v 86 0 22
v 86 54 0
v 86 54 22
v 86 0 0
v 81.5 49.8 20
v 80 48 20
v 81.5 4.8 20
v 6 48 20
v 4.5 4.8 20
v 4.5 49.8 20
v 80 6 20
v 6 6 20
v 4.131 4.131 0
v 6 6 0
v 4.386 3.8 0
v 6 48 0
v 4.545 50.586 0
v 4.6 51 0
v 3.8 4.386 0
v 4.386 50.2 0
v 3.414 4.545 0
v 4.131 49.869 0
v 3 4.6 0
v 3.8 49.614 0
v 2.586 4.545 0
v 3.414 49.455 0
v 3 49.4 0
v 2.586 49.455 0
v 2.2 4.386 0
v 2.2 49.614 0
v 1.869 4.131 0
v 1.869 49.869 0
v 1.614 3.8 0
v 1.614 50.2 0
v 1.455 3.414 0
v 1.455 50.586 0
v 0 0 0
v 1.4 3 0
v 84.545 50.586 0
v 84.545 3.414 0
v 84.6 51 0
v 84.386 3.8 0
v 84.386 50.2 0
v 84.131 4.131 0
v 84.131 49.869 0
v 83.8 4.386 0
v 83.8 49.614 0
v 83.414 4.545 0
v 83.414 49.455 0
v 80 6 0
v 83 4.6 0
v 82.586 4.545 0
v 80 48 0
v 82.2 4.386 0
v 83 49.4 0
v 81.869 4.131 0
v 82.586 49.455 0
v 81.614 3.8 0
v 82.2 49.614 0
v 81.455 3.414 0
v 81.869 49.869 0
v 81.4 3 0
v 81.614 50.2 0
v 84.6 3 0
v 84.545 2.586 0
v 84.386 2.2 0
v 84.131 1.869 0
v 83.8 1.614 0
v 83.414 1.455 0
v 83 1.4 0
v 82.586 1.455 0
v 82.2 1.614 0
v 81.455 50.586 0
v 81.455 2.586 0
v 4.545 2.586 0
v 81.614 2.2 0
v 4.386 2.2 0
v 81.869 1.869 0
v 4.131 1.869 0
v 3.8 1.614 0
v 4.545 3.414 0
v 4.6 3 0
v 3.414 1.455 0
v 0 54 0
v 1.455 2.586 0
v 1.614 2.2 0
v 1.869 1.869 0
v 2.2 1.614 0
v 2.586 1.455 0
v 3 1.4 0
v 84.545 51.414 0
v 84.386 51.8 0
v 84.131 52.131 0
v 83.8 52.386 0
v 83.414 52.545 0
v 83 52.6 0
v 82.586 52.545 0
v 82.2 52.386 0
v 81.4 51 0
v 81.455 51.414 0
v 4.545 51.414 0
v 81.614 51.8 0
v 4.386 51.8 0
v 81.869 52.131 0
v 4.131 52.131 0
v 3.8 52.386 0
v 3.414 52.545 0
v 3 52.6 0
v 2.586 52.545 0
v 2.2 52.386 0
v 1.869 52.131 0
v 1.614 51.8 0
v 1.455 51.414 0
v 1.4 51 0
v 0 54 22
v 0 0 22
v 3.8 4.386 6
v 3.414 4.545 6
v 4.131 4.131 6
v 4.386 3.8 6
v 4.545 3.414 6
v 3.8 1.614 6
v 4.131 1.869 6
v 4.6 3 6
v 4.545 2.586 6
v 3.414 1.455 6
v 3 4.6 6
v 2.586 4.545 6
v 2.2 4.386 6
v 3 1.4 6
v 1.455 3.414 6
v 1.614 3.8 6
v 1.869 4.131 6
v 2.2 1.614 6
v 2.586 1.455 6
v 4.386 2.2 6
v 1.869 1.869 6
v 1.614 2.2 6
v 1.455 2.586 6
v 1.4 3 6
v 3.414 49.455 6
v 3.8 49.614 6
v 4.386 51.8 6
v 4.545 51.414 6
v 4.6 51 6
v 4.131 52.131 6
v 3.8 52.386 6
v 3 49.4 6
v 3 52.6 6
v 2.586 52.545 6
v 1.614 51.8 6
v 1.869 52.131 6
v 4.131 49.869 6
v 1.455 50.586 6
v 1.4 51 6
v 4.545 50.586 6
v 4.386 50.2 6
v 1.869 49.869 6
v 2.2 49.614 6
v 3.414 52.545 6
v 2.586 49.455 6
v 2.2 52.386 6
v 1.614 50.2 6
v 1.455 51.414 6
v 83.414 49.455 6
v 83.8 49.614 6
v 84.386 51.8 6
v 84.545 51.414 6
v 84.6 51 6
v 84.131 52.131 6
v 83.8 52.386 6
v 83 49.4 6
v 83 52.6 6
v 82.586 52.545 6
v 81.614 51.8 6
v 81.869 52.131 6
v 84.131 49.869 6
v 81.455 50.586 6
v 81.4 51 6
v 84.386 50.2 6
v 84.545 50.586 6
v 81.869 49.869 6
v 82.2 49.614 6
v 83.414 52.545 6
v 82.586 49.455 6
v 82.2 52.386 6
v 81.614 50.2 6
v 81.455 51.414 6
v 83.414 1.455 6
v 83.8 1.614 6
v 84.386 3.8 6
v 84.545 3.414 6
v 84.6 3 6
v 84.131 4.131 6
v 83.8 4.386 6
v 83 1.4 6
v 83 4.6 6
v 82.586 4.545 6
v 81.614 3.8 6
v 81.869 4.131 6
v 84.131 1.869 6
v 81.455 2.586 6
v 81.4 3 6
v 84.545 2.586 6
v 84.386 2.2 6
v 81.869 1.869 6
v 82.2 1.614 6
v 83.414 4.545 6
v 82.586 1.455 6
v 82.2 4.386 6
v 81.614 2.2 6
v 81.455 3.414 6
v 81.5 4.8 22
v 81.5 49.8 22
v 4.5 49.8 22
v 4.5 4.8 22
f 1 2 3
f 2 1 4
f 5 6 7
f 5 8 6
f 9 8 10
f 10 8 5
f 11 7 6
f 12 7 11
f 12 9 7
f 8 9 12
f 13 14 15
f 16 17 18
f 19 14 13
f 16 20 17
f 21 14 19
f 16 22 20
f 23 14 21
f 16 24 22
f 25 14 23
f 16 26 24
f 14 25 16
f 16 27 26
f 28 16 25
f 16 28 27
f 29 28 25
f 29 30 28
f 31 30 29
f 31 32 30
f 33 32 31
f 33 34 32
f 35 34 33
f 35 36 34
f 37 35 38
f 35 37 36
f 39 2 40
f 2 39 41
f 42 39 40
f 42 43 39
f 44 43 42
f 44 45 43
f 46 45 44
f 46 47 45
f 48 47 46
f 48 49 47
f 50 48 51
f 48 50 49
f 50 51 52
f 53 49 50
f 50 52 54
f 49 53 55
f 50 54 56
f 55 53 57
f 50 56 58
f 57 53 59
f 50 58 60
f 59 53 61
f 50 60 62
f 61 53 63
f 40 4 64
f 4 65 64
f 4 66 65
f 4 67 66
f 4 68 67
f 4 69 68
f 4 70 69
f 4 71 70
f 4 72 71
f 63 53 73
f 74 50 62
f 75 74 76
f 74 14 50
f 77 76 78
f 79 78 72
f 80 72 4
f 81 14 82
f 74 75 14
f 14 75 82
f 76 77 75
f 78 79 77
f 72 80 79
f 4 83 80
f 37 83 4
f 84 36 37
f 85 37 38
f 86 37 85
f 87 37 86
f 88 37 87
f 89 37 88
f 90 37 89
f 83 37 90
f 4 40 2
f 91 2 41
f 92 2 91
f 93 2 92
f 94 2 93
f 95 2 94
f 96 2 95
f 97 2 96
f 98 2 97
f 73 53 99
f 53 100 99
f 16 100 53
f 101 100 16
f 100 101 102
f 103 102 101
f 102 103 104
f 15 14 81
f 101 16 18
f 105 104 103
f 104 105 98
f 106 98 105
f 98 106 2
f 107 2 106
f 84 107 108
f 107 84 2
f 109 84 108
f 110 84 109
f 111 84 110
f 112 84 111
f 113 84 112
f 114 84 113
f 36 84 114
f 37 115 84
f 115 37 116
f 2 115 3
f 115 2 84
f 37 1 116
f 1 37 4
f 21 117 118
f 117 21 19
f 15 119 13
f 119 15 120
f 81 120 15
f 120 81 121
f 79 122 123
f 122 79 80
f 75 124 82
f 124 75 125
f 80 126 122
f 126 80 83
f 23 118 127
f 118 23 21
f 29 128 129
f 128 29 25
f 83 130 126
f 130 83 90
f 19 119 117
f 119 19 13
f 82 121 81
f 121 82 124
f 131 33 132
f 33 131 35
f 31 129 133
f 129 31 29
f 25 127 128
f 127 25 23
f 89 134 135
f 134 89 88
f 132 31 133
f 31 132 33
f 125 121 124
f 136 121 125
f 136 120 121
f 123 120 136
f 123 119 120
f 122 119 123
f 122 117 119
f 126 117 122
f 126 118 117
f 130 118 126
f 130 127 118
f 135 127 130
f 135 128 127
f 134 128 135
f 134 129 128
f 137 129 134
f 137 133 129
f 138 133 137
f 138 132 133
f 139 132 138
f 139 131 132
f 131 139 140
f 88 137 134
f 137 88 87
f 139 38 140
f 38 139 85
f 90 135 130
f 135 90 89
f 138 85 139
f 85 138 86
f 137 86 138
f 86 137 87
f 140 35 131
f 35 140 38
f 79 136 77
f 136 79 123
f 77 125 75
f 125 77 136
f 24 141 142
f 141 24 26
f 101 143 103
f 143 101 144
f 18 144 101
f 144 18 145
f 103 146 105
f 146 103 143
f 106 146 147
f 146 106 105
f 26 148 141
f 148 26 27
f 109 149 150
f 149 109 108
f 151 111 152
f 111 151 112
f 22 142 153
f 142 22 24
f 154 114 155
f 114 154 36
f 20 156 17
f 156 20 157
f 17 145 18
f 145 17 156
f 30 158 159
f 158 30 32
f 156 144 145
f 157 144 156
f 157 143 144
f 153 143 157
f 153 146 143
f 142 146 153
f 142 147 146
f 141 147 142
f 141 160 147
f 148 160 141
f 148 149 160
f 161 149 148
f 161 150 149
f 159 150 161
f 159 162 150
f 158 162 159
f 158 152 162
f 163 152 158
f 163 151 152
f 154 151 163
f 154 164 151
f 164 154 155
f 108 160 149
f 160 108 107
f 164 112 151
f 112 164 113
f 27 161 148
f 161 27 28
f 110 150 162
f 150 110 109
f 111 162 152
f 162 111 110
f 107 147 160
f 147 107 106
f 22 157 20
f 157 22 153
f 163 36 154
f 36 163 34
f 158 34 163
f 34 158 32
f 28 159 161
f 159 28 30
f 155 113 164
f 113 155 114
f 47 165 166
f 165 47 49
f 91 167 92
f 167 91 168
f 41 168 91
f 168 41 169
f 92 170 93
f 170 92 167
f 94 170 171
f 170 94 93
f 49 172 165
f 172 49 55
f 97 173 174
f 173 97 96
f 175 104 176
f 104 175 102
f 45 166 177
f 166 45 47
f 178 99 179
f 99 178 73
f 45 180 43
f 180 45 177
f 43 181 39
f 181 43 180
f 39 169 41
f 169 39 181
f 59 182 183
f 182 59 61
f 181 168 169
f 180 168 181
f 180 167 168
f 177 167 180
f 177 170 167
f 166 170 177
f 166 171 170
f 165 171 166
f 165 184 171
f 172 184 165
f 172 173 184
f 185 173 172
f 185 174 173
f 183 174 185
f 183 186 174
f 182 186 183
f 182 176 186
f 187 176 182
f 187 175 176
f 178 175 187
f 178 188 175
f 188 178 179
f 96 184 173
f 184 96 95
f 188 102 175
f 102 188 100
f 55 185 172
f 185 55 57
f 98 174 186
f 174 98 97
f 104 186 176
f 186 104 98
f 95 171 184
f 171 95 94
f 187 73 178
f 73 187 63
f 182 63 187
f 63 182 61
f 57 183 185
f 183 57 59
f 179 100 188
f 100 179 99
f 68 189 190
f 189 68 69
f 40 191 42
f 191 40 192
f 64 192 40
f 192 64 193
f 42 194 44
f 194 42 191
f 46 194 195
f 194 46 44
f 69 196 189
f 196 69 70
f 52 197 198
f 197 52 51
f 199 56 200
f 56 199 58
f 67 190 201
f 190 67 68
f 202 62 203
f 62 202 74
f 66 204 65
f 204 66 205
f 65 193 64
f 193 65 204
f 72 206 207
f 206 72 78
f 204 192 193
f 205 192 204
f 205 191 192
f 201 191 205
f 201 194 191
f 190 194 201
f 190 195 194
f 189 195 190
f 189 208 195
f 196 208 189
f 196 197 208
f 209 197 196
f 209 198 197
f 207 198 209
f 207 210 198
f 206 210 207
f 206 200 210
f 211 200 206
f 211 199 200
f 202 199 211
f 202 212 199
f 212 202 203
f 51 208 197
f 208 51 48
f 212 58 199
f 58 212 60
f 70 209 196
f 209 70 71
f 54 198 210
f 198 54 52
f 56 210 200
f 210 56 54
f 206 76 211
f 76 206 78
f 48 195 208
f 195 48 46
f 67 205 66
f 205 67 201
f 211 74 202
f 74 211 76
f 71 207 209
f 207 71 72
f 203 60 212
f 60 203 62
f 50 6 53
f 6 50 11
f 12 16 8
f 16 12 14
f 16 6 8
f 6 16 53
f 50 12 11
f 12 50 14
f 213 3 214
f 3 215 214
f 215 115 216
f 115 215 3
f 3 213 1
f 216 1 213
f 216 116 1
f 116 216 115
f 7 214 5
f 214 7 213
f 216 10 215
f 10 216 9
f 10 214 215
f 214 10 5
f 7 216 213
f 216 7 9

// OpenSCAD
// Epiphany Cluster Fan Cooling 3D Design

// Copyright (c) 2014 by Jeremy Bennett <jeremy.bennett@embecosm.com>

// Epiphany Cluster Fan Cooling 3D Design is licensed under a Creative Commons
// Attribution-ShareAlike 3.0 Unported License.

// You should have received a copy of the license along with this work.  If not, 
// see <http://creativecommons.org/licenses/by-sa/3.0/>.

// -----------------------------------------------------------------------------

// Fan base for Epiphany Cluster fan cooling

// This is a base to which a pair of fans can be fixed. The entire design is
// parameterized to facilitate changing for different size fans.


//include </home/jeremy/personal/things/TextGenerator/TextGenerator.scad>
//include </home/jeremy/tools/openscad/dimlines/dimlines.scad>


// Polygon as a starter for the base
module base_outline () {
	polygon (points = [ // Pounts for outline of base
                       [0, 0],						// Point 0
							 [0, Y_OFF_1],				// Point 1 (not used)
							 [X_OFF_1, Y_OFF_1],		// Point 2 (not used)
							 [X_OFF_1, Y_OFF_2],		// Point 3 (not used)
							 [0, Y_OFF_2],				// Point 4 (not used)
							 [0, Y_OFF_3],				// Point 5
							 [X_OFF_3, Y_OFF_3],		// Point 6
							 [X_OFF_3, Y_OFF_2],		// Point 7 (not used)
							 [X_OFF_2, Y_OFF_2],		// Point 8 (not used)
							 [X_OFF_2, Y_OFF_1],		// Point 9 (not used)
                       [X_OFF_3, Y_OFF_1],		// Point 10 (not used)
							 [X_OFF_3, 0],				// Point 11

                       // Points for centre cutout
                       [X_OFF_1 + 6, Y_OFF_1 + 6],		// Point 12
							 [X_OFF_1 + 6, Y_OFF_2 - 6],		// Point 13
							 [X_OFF_2 - 6, Y_OFF_2 - 6],		// Point 14
							 [X_OFF_2 - 6, Y_OFF_1 + 6],		// Point 15
  
                       // Points for fan cutout 1
                       [FAN_HOLE_OFFSET * 2, 6],							// Point 16
							 [FAN_HOLE_OFFSET * 2, Y_OFF_1 - 6],				// Point 17
							 [X_OFF_3 - FAN_HOLE_OFFSET * 2, Y_OFF_1 - 6],	// Point 18
							 [X_OFF_3 - FAN_HOLE_OFFSET * 2, 6],				// Point 19

                       // Points for fan hole 2
                       [FAN_HOLE_OFFSET * 2, Y_OFF_2 + 6],				// Point 20
							 [FAN_HOLE_OFFSET * 2, Y_OFF_3 - 6],				// Point 21
							 [X_OFF_3 - FAN_HOLE_OFFSET * 2, Y_OFF_3 - 6],	// Point 22
							 [X_OFF_3 - FAN_HOLE_OFFSET * 2, Y_OFF_2 + 6]	// Point 23
						  ],
            paths = [ // Board outline
                      [0, 5, 6, 11],
                      // Cutout for centre hole
                      [12, 13, 14, 15],
	                   // Cutout for first fan hole
                      [16, 17, 18, 19],
	                   // Cutout for second fan hole
                      [20, 21, 22, 23]
                    ]);
}


// Cutout for base end

module board_edge_cutout () {
	translate (v = [X_OFF_1 / 2, BOARD_WIDTH / 2, 1]) {
		scale (v = [2 * X_OFF_1 / BOARD_WIDTH, 1, 1]) {
			circle (r = BOARD_WIDTH / 2, $fn = 240);
		}
	}
}

// Cutout for Epiphany stack

module stack_cutout () {
	minkowski ($fn = 50) {
		square (size = [BOARD_LENGTH - 18, BOARD_WIDTH - 18]);
		translate (v = [3, 3, 0])
			circle (r = 3);
	}
}

// Cutout for fan

module fan_cutout () {
	FAN_HOLE_WIDTH = FAN_THICKNESS + LUG_TOTAL_THICKNESS;
	FAN_HOLE_LENGTH = FAN_DIAMETER - FAN_HOLE_OFFSET * 4;
	minkowski ($fn = 50) {
		square (size = [FAN_HOLE_LENGTH - 18, FAN_HOLE_WIDTH - 18]);
		translate (v = [3, 3, 0])
			circle (r = 3);
	}
}


// Base is a linear extrusion of the cutout shape we would like.

module base () {
	linear_extrude (height = BASE_THICKNESS, center = false) {
		difference () {
			square (size = [X_OFF_3, Y_OFF_3], center = false);
			translate (v = [-X_OFF_1 / 2, Y_OFF_1, 0])
				board_edge_cutout ();
			translate (v = [X_OFF_3 - X_OFF_1 / 2, Y_OFF_1, 0])
				board_edge_cutout ();
			translate (v = [X_OFF_1 + 6, Y_OFF_1 + 6, 0])
				stack_cutout ();
			translate (v = [FAN_HOLE_OFFSET * 2 + 6, 6, 0])
				fan_cutout ();
			translate (v = [FAN_HOLE_OFFSET * 2 + 6, Y_OFF_2 + 6, 0])
				fan_cutout ();
		}
	}
}


// Support for the end of a fan. Make cube at base 1 mm bigger so we can get a
// 2-manifold when combined with the base. Make the cube hollow to save plastic. 
module fan_support () {
	difference () {
		cube (size = [FAN_HOLE_OFFSET * 2,
						  FAN_THICKNESS + LUG_TOTAL_THICKNESS,
      	           FAN_ELEVATION + 1], center = false);
		translate (v = [3, 3, 0])
			cube (size = [ FAN_HOLE_OFFSET * 2 - 6,
							   FAN_THICKNESS + LUG_TOTAL_THICKNESS - 6,
							   FAN_ELEVATION + 1 - 3], center = false);
		}

	// Lugs have a 1mm overlap to ensure we get a 2-manifold
	translate (v = [0, 0, FAN_ELEVATION])
		difference () {
			lug (LUG_OUTER_THICKNESS);
			lug_hole (FAN_HOLE_DIAMETER, LUG_OUTER_THICKNESS);
		}

	translate (v = [0, FAN_THICKNESS + LUG_OUTER_THICKNESS, FAN_ELEVATION])
		difference () {
			lug (LUG_INNER_THICKNESS);
			lug_hole (FAN_HOLE_DIAMETER, LUG_INNER_THICKNESS);
			lug_head_hole (SCREW_HEAD_DIAMETER, SCREW_HEAD_THICKNESS,
								LUG_INNER_THICKNESS);
		}
}


// A mirror image of the fan support.
module mirror_fan_support () {
	translate (v = [0, FAN_THICKNESS + LUG_TOTAL_THICKNESS, 0])
		mirror (v = [0, 1, 0])
			fan_support ();
}


// Lug for mounting fan. Extrude and rotate. Make 1mm deeper than expected to
// ensure we can get a 2-manifold when comined with fan support.

// @param thickness  How thick should this lug be?
module lug (thickness) {
	translate (v = [0, thickness, 0]) {
		rotate (a = 90, v = [1, 0, 0]) {
			linear_extrude (height = thickness, centre = false) {
				union () {
					square (size = [FAN_HOLE_OFFSET * 2, FAN_HOLE_OFFSET + 2],
					        centre = false);
					translate (v = [FAN_HOLE_OFFSET, FAN_HOLE_OFFSET + 2, 0]) {
						circle (r = FAN_HOLE_OFFSET, $fn = 120);
					}
				}
			}
		}
	}
}


// Lug holes. These are typically 4mm for common fans. Make them stick out
// 1mm each end so they cut a full hole. Remember that the lug is 1mm deeper
// than expected to ensure we get a 2-manifold with the base.

// @param diameter   Diameter of the lug hole
// @param thickness  How thick is the lug
module lug_hole (diameter, thickness) {
	translate (v = [FAN_HOLE_OFFSET - (diameter / 2),
						 thickness + 1,
                   FAN_HOLE_OFFSET - (diameter / 2) + 1])
		rotate (a = 90, v = [1, 0, 0])
			translate (v = [diameter / 2, diameter / 2, 0])
				cylinder (h = thickness + 2, r = diameter / 2, $fn = 24,
                      center = false);
}


// Lug screw head hole. This allows us to sink the screw head into the lug.

// @param head_diameter   Diameter of the screw head
// @param head_thickness  How thick is the screw head
// @param lug_thickness   How thick is the lug
module lug_head_hole (head_diameter, head_thickness, lug_thickness) {
	translate (v = [FAN_HOLE_OFFSET - (head_diameter / 2),
						 lug_thickness + 1,
                   FAN_HOLE_OFFSET - (head_diameter / 2) + 1])
		rotate (a = 90, v = [1, 0, 0])
			translate (v = [head_diameter / 2, head_diameter / 2, 0])
				cylinder (h = head_thickness + 1, r = head_diameter / 2, $fn = 24,
                      center = false);
}

// Base holes. These are typically 3mm and stick out 1mm each end so they cut a full
// hole. There is a recess for the head. Note that this hole will be centered on the
// origin in the X/Y plane
module base_hole (diameter, head_diameter, head_thickness) {
	translate (v = [	0, 0, -1])
		cylinder (h = BASE_THICKNESS + 2, r = diameter / 2, $fn = 24,
				    center = false);
	translate (v = [	0, 0, -1])
		cylinder (h = head_thickness + 1, r = head_diameter / 2, $fn = 24,
				   center = false);
}

module top_hole (diameter, head_diameter, head_thickness) {
	translate (v = [	0, 0, -1])
		cylinder (h = BASE_THICKNESS + 2, r = diameter / 2, $fn = 24,
				    center = false);
}


// The complete design of a base and four fan supports

module epiphany_base () {
	// Base has four holes
	difference () {
		base ();
		translate (v = [X_OFF_1 + PAD_OFF_1, Y_OFF_1 + PAD_OFF_1, 0])
			base_hole (BOARD_HOLE_DIAMETER, BASE_SCREW_HEAD_DIAMETER,
						 BASE_SCREW_HEAD_THICKNESS);
		translate (v = [X_OFF_1 + PAD_OFF_1, Y_OFF_2 - PAD_OFF_2, 0])
			base_hole (BOARD_HOLE_DIAMETER, BASE_SCREW_HEAD_DIAMETER,
						 BASE_SCREW_HEAD_THICKNESS);
		translate (v = [X_OFF_2 - PAD_OFF_2, Y_OFF_2 - PAD_OFF_2, 0])
			base_hole (BOARD_HOLE_DIAMETER, BASE_SCREW_HEAD_DIAMETER,
						 BASE_SCREW_HEAD_THICKNESS);
		translate (v = [X_OFF_2 - PAD_OFF_2, Y_OFF_1 + PAD_OFF_1, 0])
			base_hole (BOARD_HOLE_DIAMETER, BASE_SCREW_HEAD_DIAMETER,
						 BASE_SCREW_HEAD_THICKNESS);
	}

	// All fan supports overlap by 1mm, to ensure we get a 2-manifold.
	translate (v = [0, 0, BOARD_THICKNESS - 1])
		fan_support ();
	translate (v = [X_OFF_3 - FAN_HOLE_OFFSET * 2, 0, BOARD_THICKNESS - 1])
		fan_support ();
	translate (v = [0, Y_OFF_1 + BOARD_WIDTH , BOARD_THICKNESS - 1])
		mirror_fan_support ();
	translate (v = [X_OFF_3 - FAN_HOLE_OFFSET * 2, Y_OFF_1 + BOARD_WIDTH,
						 BOARD_THICKNESS - 1])
		mirror_fan_support ();
}

PCB_WIDTH = 51;
PCB_LENGTH = 89;

module epiphany_top () {
	TOP_BASE_HEIGHT=BASE_THICKNESS*4;
	TOP_TOP_HEIGHT=2;
	difference() {
		cube (size = [BOARD_LENGTH, BOARD_WIDTH, TOP_BASE_HEIGHT]);
		translate (v = [PAD_OFF_1, PAD_OFF_1, 0])
			top_hole (BOARD_HOLE_DIAMETER, BASE_SCREW_HEAD_DIAMETER,
						 BASE_SCREW_HEAD_THICKNESS);
		translate (v = [PAD_OFF_1, BOARD_WIDTH - PAD_OFF_2, 0])
		 	top_hole (BOARD_HOLE_DIAMETER, BASE_SCREW_HEAD_DIAMETER,
						 BASE_SCREW_HEAD_THICKNESS);
		translate (v = [BOARD_LENGTH - PAD_OFF_2, BOARD_WIDTH - PAD_OFF_2, 0])
			top_hole (BOARD_HOLE_DIAMETER, BASE_SCREW_HEAD_DIAMETER,
						 BASE_SCREW_HEAD_THICKNESS);
		translate (v = [BOARD_LENGTH - PAD_OFF_2, PAD_OFF_1, 0])
			top_hole (BOARD_HOLE_DIAMETER, BASE_SCREW_HEAD_DIAMETER,
						 BASE_SCREW_HEAD_THICKNESS);
	   translate (v = [PAD_OFF_2*2, PAD_OFF_2*2, 0])
			cube (size = [BOARD_LENGTH-4*PAD_OFF_2, BOARD_WIDTH-4*PAD_OFF_2, TOP_BASE_HEIGHT]);
	}
	// Board holding half
	translate (v = [0, 0, TOP_BASE_HEIGHT])
	difference() {
		cube (size = [BOARD_LENGTH, BOARD_WIDTH, TOP_TOP_HEIGHT]);
	   translate (v = [PAD_OFF_2*1.5, PAD_OFF_2*1.6, 0])
			cube (size = [BOARD_LENGTH-3*PAD_OFF_2, BOARD_WIDTH-3*PAD_OFF_2, TOP_TOP_HEIGHT]);
	}
}



// A spacer. Useful if the fan has a guard to go outside the lugs

module spacer (thickness) {
	translate (v = [FAN_HOLE_OFFSET, FAN_HOLE_OFFSET, 0])
		cylinder (h = thickness, r = FAN_HOLE_OFFSET, center = false);
}


// Constants defining the design

// Cluster boards are 86mm x 54mm. Mounting holes 3mm on the center of 6mm pads
// in each corner.

// The entire stack is 123mm to base of top layer.

// Fans are 120mm x 120mm x 25mm, with mounting hole centers 105mm apart in each
// corner.

// The fans are lifted 15mm from the base position, since there is no need to
// blow under the bottom board, while there is a need to blow across the top
// board.

FAN_DIAMETER = 120;				// Overall diameter of the fan.
FAN_THICKNESS = 25;				// Overall thickness of the fan
FAN_HOLE_OFFSET = 7.5;			// How far mounting holes centers are in from base
FAN_HOLE_DIAMETER = 4;			// Diameter of mounting holes
FAN_ELEVATION = 15;				// How far we lift fan from base of stack
LUG_INNER_THICKNESS = 5;		// Inner lug thickness (must sink screw head)
LUG_OUTER_THICKNESS = 5;		// Outer lug thickness
SCREW_HEAD_THICKNESS = 3;		// How deep to sink screw head
SCREW_HEAD_DIAMETER = 9;		// How wide is screw head
BOARD_WIDTH = 54;				// Width of parallella board
BOARD_LENGTH = 86;				// Length of parallella board
BOARD_HOLE_DIAMETER = 3.2;		// Diameter of parallella mounting holes (with play)
PAD_WIDTH = 6;					// Width (and length) of pad with mounting holes
BASE_THICKNESS = 5;				// Thickness of the main base
BASE_SCREW_HEAD_DIAMETER = 7;	// Screws holding base
BASE_SCREW_HEAD_THICKNESS = 3;// How deep to sink screw

// Useful derived constants
LUG_TOTAL_THICKNESS = LUG_INNER_THICKNESS + LUG_OUTER_THICKNESS;
X_OFF_1 = (FAN_DIAMETER - BOARD_LENGTH) / 2;
X_OFF_2 = (FAN_DIAMETER + BOARD_LENGTH) / 2;
X_OFF_3 = FAN_DIAMETER;
Y_OFF_1 = FAN_THICKNESS + LUG_TOTAL_THICKNESS;
Y_OFF_2 = Y_OFF_1 + BOARD_WIDTH;
Y_OFF_3 = Y_OFF_1 * 2 + BOARD_WIDTH;
PAD_OFF_1 = (PAD_WIDTH) / 2;
PAD_OFF_2 = 6 - (PAD_WIDTH) / 2;

// The design

epiphany_top ();
//spacer (LUG_OUTER_THICKNESS);

DIM_LINE_WIDTH = 0.2;
//color ("black")
//	translate([20, 38, -20])
//		rotate([0, 0, 90])
//			dimensions (length=48);

//color ("black")
//	translate([20, 38, -20])
//		rotate([0, 0, 0])
//			dimensions (length=80);
